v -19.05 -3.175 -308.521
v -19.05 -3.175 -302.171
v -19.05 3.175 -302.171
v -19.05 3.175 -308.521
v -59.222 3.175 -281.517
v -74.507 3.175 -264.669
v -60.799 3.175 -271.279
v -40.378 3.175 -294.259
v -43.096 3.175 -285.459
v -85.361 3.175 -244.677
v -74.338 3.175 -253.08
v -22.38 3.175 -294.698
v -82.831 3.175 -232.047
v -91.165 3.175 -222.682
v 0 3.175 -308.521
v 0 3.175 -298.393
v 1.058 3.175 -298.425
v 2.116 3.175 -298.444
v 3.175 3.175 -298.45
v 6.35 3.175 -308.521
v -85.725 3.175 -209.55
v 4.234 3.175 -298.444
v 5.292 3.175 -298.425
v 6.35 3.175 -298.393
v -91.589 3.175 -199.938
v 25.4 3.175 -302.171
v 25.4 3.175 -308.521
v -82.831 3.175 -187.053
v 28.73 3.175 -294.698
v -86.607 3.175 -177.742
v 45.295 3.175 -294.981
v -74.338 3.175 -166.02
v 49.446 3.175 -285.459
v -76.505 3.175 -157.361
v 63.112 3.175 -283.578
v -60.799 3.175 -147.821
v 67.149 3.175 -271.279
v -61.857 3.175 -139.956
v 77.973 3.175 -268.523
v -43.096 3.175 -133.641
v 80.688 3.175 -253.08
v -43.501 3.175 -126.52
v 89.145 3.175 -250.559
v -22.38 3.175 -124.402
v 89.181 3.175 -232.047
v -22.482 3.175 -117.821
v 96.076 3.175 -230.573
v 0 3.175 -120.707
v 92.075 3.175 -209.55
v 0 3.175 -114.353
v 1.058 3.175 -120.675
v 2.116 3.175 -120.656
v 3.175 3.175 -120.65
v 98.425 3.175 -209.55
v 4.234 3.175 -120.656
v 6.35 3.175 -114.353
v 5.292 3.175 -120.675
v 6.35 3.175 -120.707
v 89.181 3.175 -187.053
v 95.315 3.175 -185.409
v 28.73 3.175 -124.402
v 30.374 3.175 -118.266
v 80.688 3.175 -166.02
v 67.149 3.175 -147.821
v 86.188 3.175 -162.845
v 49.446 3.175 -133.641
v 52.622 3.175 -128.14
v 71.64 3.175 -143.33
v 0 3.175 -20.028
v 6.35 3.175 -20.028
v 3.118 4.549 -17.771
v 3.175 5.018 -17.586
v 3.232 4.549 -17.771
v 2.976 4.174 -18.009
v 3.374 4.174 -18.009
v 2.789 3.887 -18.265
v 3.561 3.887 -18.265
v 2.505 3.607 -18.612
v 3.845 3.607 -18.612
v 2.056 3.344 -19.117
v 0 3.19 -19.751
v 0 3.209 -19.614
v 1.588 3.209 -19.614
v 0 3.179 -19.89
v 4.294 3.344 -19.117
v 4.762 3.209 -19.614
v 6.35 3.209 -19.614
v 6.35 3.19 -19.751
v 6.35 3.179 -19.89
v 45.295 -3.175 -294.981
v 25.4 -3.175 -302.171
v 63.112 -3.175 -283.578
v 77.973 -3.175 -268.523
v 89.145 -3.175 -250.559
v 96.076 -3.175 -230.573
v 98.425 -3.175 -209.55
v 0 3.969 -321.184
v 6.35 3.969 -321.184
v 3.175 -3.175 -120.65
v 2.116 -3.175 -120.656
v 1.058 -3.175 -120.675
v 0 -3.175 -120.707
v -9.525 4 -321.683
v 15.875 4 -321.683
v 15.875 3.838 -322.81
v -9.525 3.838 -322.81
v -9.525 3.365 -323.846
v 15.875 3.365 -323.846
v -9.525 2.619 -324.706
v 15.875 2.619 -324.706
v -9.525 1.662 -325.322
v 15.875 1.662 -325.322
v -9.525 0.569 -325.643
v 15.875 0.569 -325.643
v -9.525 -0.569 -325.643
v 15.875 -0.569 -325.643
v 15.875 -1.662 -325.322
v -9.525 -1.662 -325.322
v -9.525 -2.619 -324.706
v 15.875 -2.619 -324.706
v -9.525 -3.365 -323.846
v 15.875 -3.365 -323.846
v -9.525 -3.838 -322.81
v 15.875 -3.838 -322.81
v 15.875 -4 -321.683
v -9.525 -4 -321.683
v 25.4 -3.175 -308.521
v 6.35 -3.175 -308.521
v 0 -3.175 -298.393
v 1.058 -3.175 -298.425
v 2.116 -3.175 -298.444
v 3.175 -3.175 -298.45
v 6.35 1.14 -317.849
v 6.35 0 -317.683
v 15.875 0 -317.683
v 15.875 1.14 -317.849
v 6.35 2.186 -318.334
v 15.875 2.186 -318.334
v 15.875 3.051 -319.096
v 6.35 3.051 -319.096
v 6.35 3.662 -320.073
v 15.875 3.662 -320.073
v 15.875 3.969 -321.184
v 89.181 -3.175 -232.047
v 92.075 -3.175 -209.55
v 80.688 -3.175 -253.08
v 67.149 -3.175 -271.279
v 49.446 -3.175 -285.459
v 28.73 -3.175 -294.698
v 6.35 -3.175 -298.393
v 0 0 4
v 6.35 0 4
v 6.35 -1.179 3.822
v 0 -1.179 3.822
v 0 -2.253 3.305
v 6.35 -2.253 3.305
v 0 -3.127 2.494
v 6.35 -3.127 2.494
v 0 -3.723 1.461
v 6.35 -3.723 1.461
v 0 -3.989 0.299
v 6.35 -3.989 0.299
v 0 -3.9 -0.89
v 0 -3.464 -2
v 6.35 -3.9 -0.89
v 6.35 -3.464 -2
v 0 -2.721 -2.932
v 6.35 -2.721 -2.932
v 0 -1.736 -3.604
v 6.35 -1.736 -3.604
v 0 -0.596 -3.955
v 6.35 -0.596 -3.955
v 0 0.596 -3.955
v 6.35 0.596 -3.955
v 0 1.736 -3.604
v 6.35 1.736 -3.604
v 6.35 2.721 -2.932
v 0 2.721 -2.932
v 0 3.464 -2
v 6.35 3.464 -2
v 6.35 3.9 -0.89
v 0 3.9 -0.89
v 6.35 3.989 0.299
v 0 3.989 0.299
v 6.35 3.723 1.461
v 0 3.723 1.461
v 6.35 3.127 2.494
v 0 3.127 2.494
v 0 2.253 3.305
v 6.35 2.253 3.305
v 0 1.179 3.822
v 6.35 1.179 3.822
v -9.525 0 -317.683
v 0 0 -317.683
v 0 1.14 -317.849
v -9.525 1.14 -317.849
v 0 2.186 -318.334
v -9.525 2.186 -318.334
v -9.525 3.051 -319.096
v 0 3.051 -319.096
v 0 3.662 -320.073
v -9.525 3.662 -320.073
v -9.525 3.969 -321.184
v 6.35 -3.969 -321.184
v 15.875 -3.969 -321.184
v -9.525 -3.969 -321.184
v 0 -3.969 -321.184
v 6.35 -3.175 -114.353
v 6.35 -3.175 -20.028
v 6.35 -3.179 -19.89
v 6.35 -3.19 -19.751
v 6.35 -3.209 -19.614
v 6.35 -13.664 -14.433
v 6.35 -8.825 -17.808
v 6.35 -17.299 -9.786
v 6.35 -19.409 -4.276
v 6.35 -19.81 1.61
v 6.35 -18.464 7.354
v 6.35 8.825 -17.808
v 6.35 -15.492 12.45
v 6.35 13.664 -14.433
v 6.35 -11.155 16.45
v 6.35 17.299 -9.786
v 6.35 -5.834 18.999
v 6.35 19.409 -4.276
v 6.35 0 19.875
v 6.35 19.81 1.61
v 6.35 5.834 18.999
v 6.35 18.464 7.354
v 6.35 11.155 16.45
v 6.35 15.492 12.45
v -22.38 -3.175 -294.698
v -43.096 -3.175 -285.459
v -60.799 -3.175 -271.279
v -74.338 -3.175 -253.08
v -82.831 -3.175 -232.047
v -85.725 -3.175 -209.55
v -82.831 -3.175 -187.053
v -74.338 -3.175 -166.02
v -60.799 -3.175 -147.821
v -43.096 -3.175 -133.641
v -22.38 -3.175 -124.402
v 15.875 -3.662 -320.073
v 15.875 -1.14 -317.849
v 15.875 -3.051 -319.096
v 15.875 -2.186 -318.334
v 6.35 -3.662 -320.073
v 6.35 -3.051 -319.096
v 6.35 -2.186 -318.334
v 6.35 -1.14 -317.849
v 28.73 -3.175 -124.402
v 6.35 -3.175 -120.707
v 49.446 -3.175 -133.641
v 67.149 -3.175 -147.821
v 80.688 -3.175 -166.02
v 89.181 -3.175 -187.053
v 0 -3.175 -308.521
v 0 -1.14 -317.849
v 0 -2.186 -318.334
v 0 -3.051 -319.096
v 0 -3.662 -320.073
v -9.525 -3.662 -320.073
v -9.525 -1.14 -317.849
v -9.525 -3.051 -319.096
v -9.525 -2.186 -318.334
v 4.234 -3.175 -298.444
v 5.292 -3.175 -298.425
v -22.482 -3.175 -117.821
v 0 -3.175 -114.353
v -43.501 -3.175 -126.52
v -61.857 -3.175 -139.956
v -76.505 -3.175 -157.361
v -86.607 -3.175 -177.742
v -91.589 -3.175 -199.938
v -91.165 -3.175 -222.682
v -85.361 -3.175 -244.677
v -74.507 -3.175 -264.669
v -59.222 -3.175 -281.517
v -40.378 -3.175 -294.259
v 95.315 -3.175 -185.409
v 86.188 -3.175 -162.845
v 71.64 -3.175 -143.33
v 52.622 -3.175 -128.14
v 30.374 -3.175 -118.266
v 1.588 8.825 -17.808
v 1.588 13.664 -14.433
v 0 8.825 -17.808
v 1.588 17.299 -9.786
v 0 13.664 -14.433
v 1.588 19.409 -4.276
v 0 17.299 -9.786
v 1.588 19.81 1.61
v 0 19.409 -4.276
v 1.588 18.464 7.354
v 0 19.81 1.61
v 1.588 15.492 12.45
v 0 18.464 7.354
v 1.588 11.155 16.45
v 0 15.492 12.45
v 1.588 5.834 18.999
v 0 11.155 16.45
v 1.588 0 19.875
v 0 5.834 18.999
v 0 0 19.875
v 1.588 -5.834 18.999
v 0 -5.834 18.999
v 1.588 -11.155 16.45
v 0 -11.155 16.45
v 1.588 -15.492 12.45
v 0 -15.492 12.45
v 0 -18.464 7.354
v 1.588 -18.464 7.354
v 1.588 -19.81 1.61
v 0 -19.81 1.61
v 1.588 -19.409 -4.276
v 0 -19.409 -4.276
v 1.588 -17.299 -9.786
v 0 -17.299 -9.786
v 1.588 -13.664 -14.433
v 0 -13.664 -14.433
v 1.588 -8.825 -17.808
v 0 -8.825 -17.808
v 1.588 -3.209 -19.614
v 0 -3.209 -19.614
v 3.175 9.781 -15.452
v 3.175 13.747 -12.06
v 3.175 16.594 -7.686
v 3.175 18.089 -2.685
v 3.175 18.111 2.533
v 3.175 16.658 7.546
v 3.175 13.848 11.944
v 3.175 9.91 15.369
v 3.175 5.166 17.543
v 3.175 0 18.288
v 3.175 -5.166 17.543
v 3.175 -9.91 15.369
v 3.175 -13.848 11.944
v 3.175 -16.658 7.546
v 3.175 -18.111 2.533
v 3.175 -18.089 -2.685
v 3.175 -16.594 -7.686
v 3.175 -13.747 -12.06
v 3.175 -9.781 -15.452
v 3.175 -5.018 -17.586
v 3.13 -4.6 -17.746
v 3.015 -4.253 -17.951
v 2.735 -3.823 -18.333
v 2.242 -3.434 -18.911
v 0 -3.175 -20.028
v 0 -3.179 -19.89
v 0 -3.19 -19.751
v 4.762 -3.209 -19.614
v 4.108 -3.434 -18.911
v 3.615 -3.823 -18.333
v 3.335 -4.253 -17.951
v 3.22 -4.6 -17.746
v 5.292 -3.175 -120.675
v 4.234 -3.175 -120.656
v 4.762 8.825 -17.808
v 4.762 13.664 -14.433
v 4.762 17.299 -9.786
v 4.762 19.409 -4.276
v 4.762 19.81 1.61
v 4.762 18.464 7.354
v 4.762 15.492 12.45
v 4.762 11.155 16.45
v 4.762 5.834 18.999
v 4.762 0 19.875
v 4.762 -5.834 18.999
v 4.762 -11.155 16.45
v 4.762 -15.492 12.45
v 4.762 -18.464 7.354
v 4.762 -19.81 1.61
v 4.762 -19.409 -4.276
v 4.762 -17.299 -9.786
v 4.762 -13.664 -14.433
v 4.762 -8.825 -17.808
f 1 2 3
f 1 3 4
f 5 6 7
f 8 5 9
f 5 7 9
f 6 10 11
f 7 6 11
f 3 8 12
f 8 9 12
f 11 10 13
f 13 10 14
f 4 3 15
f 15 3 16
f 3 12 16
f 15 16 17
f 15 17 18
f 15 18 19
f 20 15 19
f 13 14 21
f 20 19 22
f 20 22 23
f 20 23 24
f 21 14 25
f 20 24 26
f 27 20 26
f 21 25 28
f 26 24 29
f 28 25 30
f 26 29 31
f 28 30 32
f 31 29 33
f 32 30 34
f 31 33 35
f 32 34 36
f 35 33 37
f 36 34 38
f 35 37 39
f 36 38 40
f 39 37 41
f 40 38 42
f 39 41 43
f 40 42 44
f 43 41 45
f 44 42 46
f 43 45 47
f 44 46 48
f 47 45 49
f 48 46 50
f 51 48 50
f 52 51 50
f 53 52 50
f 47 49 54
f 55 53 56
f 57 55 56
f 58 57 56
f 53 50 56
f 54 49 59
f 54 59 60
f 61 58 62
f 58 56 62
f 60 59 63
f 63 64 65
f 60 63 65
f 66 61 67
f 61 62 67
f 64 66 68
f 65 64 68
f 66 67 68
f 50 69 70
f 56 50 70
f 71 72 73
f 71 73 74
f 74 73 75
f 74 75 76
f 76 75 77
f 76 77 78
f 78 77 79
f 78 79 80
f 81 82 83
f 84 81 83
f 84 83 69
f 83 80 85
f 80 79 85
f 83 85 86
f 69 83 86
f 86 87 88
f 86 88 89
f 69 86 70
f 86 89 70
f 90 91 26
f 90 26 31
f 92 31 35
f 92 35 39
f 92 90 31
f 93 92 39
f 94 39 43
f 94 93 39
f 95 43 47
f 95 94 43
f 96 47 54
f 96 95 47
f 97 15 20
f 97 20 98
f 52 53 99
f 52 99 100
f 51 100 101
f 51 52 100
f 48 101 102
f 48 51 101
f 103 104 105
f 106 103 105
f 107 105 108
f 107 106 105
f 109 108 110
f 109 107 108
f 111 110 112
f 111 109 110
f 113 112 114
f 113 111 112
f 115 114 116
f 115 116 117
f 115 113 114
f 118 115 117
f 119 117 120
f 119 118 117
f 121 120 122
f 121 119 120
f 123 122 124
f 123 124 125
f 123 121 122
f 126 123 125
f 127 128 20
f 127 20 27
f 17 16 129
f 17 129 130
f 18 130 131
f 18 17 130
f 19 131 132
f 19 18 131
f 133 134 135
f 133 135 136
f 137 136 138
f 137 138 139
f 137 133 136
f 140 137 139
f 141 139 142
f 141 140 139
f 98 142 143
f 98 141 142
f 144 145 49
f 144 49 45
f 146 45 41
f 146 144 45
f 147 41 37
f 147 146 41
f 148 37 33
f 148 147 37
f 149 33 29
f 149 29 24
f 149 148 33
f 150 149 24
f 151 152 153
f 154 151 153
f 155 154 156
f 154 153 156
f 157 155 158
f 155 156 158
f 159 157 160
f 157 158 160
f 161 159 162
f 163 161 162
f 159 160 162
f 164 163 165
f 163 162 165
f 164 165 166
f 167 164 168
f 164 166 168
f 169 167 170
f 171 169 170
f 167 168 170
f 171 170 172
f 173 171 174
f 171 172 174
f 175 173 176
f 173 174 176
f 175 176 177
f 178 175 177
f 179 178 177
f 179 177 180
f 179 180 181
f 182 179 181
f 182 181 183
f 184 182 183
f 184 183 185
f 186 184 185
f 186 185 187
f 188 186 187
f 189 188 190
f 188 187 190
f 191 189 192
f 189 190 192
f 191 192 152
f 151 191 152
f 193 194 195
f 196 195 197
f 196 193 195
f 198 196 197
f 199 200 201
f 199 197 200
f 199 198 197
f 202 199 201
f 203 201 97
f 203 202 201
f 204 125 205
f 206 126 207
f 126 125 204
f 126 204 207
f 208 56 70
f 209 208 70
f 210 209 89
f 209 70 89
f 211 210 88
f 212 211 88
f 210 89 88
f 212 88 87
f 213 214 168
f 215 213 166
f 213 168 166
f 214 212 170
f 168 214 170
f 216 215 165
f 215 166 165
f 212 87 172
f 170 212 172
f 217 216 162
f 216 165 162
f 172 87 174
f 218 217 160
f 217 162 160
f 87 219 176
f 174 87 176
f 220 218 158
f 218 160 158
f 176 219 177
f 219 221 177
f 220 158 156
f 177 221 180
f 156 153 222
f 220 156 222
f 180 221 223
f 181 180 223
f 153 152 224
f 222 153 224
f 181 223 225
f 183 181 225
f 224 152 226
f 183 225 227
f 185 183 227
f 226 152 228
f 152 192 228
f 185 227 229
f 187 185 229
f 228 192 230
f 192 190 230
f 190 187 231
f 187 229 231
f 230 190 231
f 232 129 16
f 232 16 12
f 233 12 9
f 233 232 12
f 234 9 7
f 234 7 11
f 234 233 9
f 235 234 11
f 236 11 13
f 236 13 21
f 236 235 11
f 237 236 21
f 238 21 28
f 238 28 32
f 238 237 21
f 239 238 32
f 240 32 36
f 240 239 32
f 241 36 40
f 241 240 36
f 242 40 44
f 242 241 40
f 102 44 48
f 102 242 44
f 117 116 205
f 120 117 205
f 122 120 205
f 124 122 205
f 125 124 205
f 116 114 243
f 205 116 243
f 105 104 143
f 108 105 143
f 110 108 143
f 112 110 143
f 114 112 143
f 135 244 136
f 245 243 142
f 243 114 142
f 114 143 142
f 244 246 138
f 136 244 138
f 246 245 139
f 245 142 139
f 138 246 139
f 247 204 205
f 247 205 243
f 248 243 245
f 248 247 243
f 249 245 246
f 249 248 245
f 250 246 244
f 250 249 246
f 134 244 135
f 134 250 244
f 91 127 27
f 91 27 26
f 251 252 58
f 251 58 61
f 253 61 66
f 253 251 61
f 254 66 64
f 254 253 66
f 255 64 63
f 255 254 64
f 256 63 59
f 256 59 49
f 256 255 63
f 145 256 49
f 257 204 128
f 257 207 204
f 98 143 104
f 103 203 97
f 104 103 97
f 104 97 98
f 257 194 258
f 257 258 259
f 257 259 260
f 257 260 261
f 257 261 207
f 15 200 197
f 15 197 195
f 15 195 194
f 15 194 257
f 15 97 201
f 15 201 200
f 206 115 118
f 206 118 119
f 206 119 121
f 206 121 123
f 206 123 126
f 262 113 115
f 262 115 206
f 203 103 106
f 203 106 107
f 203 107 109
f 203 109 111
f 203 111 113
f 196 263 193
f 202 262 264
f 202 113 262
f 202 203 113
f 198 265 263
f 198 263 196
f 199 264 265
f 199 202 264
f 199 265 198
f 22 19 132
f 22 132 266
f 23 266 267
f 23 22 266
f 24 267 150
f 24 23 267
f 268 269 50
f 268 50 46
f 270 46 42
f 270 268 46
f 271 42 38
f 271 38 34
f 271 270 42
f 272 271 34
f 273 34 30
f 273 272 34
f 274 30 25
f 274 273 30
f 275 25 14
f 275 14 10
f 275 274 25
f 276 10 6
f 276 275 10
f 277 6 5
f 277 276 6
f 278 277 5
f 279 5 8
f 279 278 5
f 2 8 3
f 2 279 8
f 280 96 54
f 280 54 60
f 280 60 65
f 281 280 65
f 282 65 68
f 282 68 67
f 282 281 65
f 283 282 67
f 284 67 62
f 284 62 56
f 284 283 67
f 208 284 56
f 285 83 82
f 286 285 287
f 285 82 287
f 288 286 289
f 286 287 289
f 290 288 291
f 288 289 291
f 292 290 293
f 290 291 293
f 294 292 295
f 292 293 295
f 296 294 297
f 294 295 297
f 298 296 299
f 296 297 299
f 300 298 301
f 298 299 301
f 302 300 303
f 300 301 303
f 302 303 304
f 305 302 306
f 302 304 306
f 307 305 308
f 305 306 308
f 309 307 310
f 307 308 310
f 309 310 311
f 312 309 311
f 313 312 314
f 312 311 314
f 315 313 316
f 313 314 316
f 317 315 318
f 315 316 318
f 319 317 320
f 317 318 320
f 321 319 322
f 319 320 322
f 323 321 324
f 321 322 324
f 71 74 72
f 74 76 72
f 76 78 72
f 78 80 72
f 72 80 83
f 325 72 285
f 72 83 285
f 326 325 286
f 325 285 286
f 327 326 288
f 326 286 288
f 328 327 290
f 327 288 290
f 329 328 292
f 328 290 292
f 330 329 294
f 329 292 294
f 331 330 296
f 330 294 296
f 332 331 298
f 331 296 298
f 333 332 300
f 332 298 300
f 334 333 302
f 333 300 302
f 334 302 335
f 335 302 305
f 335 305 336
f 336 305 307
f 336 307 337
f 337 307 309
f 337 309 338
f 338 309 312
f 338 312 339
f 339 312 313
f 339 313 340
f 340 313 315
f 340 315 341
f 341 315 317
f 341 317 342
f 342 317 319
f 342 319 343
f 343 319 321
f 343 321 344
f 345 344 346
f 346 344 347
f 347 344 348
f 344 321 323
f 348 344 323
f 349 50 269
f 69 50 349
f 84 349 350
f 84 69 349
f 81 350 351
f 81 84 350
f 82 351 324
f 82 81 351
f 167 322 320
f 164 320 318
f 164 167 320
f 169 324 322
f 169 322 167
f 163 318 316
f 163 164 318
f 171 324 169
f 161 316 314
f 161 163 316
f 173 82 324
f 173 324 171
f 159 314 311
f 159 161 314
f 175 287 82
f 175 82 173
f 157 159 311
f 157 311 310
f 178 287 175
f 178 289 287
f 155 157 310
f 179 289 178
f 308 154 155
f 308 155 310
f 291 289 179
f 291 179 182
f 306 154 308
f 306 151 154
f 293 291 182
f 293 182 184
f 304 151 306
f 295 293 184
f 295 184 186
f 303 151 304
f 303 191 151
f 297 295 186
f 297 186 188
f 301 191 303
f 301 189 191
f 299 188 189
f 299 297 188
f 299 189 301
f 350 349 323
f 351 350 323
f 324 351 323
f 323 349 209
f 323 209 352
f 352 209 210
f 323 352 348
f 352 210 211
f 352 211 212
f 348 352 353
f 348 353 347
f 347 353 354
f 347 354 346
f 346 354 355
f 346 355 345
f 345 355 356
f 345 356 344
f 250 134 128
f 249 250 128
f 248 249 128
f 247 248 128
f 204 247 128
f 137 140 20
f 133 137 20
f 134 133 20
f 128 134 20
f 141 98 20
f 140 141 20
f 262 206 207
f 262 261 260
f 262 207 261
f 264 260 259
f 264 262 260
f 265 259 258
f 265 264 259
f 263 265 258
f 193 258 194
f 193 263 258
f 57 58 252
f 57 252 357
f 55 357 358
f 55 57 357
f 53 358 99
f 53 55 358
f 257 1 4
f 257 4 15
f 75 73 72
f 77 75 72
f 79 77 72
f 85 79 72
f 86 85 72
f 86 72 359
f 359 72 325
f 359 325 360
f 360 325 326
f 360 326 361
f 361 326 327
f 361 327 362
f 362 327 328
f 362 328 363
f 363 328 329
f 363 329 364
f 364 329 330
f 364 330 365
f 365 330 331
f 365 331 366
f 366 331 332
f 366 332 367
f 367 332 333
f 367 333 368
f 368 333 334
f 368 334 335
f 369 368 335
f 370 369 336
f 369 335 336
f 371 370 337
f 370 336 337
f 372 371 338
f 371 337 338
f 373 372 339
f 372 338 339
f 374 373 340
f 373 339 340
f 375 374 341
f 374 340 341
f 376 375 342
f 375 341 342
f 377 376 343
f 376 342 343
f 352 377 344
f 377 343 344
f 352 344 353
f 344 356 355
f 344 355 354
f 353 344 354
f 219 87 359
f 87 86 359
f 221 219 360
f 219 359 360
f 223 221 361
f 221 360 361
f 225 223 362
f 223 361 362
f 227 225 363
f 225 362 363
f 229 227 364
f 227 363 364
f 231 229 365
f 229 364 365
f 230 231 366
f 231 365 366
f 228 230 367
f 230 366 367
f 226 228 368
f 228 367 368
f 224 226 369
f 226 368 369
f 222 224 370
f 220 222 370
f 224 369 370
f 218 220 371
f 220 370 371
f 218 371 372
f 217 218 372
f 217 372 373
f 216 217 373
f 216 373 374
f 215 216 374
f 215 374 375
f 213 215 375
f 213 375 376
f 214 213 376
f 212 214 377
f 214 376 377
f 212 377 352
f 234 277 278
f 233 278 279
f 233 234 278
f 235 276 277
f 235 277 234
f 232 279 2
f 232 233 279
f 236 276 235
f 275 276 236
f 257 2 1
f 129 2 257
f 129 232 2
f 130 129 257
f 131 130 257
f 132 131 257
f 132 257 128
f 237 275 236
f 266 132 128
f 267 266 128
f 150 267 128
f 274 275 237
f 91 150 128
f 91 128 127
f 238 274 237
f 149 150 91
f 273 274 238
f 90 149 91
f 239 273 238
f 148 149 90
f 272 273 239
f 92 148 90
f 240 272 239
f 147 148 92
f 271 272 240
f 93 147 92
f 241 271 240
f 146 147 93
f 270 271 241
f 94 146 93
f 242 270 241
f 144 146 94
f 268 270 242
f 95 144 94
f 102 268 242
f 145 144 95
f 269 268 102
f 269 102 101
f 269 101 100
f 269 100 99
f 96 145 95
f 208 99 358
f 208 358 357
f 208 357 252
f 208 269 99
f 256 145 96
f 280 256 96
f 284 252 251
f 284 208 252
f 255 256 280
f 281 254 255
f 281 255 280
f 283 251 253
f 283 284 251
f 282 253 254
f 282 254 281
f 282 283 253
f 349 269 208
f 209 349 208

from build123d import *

# Parameters (mm, degrees)
BOSS_EXTRUDE1_REACH     = 30.816
SKETCH2_R               = 4
BOSS_EXTRUDE4_DEPTH     = 6.35
CUT_EXTRUDE1_DEPTH      = 325.659613706
CUT_EXTRUDE1_DEPTH_BACK = 325.659613706
BOSS_EXTRUDE5_DEPTH     = 3.175
BOSS_EXTRUDE6_DEPTH     = 12.7


with BuildPart() as part:
    # Sketch1 → Revolve1 (revolve)
    with BuildSketch(Plane.XY, mode=Mode.PRIVATE) as revolve1_sk:
        Polygon((0, 4), (6.35, 4), (6.35, 19.875), (4.7625, 19.875), (3.175, 18.2875), (1.5875, 19.875), (0, 19.875), align=None)
    revolve(revolve1_sk.sketch.rotate(Axis((0, 0, 0), (1, 0, 0)), 90), axis=Axis((0, 0, 0), (1, 0, 0)))

    # Boss-Extrude1: up to this face of the body (flat: up to its plane)
    boss_extrude1_end = Plane(part.part.faces().sort_by_distance((0, 0, -19.312850109))[0])
    # Sketch2 → Boss-Extrude1 (add, up to the picked face)
    with BuildSketch(Plane(origin=(6.35, 0, 0), x_dir=(0, 0, -1), z_dir=(1, 0, 0)), mode=Mode.PRIVATE) as boss_extrude1_sk1:
        with BuildLine():
            Line((20.028068585, 3.175), (304.8, 3.175))
            Line((304.8, 3.175), (304.8, 0))
            Line((304.8, 0), (304.8, -3.175))
            Line((304.8, -3.175), (20.028068585, -3.175))
            ThreePointArc((20.028068585, -3.175), (18.498150057, -3.687452393), (17.585562562, -5.018032049))
            ThreePointArc((17.585562562, -5.018032049), (-18.2875, 0), (17.585562562, 5.018032049))
            ThreePointArc((17.585562562, 5.018032049), (18.498150057, 3.687452393), (20.028068585, 3.175))
        make_face()
        with Locations(Location((0, 0, 0), (0, 0, 180))):
            Circle(SKETCH2_R, mode=Mode.SUBTRACT)
    boss_extrude1_tool1 = split(extrude(boss_extrude1_sk1.sketch, amount=-BOSS_EXTRUDE1_REACH, mode=Mode.PRIVATE), bisect_by=boss_extrude1_end, keep=Keep.BOTH, mode=Mode.PRIVATE)
    add(boss_extrude1_tool1.solids().sort_by(Axis((6.35, 0, -104.167204), (-1, 0, 0)))[0])

    # Sketch6 → Boss-Extrude4 (add)
    with BuildSketch(Plane.XZ.offset(3.175)):
        with BuildLine():
            ThreePointArc((0, -114.352931374), (-91.58879889, -199.938292555), (-19.05, -302.170796126))
            ThreePointArc((-19.05, -302.170796126), (-9.590159419, -303.940747454), (0, -304.747068626))
            Line((0, -304.747068626), (0, -298.393285481))
            ThreePointArc((0, -298.393285481), (-85.725, -209.55), (0, -120.706714519))
            Line((0, -120.706714519), (0, -114.352931374))
        make_face()
        with BuildLine():
            ThreePointArc((98.425, -209.55), (71.640251223, -143.330124774), (6.35, -114.352931374))
            Line((6.35, -114.352931374), (6.35, -120.706714519))
            ThreePointArc((6.35, -120.706714519), (67.149477333, -147.820944848), (92.075, -209.55))
            ThreePointArc((92.075, -209.55), (67.149477333, -271.279055152), (6.35, -298.393285481))
            Line((6.35, -298.393285481), (6.35, -304.747068626))
            ThreePointArc((6.35, -304.747068626), (15.940159419, -303.940747454), (25.4, -302.170796126))
            ThreePointArc((25.4, -302.170796126), (77.973040583, -268.523007597), (98.425, -209.55))
        make_face()
        with BuildLine():
            ThreePointArc((0, -304.747068626), (-9.590159419, -303.940747454), (-19.05, -302.170796126))
            Line((-19.05, -302.170796126), (-19.05, -308.520796126))
            Line((-19.05, -308.520796126), (25.4, -308.520796126))
            Line((25.4, -308.520796126), (25.4, -302.170796126))
            ThreePointArc((25.4, -302.170796126), (15.940159419, -303.940747454), (6.35, -304.747068626))
            Line((6.35, -304.747068626), (6.35, -304.8))
            Line((6.35, -304.8), (3.175, -304.8))
            Line((3.175, -304.8), (0, -304.8))
            Line((0, -304.8), (0, -304.747068626))
        make_face()
    extrude(amount=-BOSS_EXTRUDE4_DEPTH)

    # Sketch6<4> → Cut-Extrude1 (cut, two sides: drawn at the far end of the back side and taken through both)
    with BuildSketch(Plane.XZ.offset(3.175).offset(-CUT_EXTRUDE1_DEPTH_BACK)):
        with BuildLine():
            ThreePointArc((0, -298.393285481), (1.58724675, -298.435820239), (3.175, -298.45))
            Line((3.175, -298.45), (3.175, -120.65))
            ThreePointArc((3.175, -120.65), (1.58724675, -120.664179761), (0, -120.706714519))
            Line((0, -120.706714519), (0, -298.393285481))
        make_face()
        with BuildLine():
            Line((3.175, -120.65), (3.175, -298.45))
            ThreePointArc((3.175, -298.45), (4.76275325, -298.435820239), (6.35, -298.393285481))
            Line((6.35, -298.393285481), (6.35, -120.706714519))
            ThreePointArc((6.35, -120.706714519), (4.76275325, -120.664179761), (3.175, -120.65))
        make_face()
    extrude(amount=CUT_EXTRUDE1_DEPTH + CUT_EXTRUDE1_DEPTH_BACK, mode=Mode.SUBTRACT)

    # Sketch8 → Boss-Extrude5 (add, symmetric)
    with BuildSketch(Plane.ZY.offset(-3.175)):
        with BuildLine():
            Line((-308.520796126, -3.175), (-308.520796126, 3.175))
            Line((-308.520796126, 3.175), (-321.183816784, 3.96869459))
            ThreePointArc((-321.183816784, 3.96869459), (-318.683458763, 2.645954285), (-317.683279744, 0))
            ThreePointArc((-317.683279744, 0), (-318.683458763, -2.645954285), (-321.183816784, -3.96869459))
            Line((-321.183816784, -3.96869459), (-308.520796126, -3.175))
        make_face()
    extrude(amount=BOSS_EXTRUDE5_DEPTH, both=True)

    # Sketch8<3> → Boss-Extrude6 (add, symmetric)
    with BuildSketch(Plane.ZY.offset(-3.175)):
        with BuildLine():
            ThreePointArc((-317.683279744, 0), (-318.683458763, 2.645954285), (-321.183816784, 3.96869459))
            Line((-321.183816784, 3.96869459), (-321.683279744, 4))
            ThreePointArc((-321.683279744, 4), (-325.683279744, 0), (-321.683279744, -4))
            Line((-321.683279744, -4), (-321.183816784, -3.96869459))
            ThreePointArc((-321.183816784, -3.96869459), (-318.683458763, -2.645954285), (-317.683279744, 0))
        make_face()
    extrude(amount=BOSS_EXTRUDE6_DEPTH, both=True)


solid = part.part
